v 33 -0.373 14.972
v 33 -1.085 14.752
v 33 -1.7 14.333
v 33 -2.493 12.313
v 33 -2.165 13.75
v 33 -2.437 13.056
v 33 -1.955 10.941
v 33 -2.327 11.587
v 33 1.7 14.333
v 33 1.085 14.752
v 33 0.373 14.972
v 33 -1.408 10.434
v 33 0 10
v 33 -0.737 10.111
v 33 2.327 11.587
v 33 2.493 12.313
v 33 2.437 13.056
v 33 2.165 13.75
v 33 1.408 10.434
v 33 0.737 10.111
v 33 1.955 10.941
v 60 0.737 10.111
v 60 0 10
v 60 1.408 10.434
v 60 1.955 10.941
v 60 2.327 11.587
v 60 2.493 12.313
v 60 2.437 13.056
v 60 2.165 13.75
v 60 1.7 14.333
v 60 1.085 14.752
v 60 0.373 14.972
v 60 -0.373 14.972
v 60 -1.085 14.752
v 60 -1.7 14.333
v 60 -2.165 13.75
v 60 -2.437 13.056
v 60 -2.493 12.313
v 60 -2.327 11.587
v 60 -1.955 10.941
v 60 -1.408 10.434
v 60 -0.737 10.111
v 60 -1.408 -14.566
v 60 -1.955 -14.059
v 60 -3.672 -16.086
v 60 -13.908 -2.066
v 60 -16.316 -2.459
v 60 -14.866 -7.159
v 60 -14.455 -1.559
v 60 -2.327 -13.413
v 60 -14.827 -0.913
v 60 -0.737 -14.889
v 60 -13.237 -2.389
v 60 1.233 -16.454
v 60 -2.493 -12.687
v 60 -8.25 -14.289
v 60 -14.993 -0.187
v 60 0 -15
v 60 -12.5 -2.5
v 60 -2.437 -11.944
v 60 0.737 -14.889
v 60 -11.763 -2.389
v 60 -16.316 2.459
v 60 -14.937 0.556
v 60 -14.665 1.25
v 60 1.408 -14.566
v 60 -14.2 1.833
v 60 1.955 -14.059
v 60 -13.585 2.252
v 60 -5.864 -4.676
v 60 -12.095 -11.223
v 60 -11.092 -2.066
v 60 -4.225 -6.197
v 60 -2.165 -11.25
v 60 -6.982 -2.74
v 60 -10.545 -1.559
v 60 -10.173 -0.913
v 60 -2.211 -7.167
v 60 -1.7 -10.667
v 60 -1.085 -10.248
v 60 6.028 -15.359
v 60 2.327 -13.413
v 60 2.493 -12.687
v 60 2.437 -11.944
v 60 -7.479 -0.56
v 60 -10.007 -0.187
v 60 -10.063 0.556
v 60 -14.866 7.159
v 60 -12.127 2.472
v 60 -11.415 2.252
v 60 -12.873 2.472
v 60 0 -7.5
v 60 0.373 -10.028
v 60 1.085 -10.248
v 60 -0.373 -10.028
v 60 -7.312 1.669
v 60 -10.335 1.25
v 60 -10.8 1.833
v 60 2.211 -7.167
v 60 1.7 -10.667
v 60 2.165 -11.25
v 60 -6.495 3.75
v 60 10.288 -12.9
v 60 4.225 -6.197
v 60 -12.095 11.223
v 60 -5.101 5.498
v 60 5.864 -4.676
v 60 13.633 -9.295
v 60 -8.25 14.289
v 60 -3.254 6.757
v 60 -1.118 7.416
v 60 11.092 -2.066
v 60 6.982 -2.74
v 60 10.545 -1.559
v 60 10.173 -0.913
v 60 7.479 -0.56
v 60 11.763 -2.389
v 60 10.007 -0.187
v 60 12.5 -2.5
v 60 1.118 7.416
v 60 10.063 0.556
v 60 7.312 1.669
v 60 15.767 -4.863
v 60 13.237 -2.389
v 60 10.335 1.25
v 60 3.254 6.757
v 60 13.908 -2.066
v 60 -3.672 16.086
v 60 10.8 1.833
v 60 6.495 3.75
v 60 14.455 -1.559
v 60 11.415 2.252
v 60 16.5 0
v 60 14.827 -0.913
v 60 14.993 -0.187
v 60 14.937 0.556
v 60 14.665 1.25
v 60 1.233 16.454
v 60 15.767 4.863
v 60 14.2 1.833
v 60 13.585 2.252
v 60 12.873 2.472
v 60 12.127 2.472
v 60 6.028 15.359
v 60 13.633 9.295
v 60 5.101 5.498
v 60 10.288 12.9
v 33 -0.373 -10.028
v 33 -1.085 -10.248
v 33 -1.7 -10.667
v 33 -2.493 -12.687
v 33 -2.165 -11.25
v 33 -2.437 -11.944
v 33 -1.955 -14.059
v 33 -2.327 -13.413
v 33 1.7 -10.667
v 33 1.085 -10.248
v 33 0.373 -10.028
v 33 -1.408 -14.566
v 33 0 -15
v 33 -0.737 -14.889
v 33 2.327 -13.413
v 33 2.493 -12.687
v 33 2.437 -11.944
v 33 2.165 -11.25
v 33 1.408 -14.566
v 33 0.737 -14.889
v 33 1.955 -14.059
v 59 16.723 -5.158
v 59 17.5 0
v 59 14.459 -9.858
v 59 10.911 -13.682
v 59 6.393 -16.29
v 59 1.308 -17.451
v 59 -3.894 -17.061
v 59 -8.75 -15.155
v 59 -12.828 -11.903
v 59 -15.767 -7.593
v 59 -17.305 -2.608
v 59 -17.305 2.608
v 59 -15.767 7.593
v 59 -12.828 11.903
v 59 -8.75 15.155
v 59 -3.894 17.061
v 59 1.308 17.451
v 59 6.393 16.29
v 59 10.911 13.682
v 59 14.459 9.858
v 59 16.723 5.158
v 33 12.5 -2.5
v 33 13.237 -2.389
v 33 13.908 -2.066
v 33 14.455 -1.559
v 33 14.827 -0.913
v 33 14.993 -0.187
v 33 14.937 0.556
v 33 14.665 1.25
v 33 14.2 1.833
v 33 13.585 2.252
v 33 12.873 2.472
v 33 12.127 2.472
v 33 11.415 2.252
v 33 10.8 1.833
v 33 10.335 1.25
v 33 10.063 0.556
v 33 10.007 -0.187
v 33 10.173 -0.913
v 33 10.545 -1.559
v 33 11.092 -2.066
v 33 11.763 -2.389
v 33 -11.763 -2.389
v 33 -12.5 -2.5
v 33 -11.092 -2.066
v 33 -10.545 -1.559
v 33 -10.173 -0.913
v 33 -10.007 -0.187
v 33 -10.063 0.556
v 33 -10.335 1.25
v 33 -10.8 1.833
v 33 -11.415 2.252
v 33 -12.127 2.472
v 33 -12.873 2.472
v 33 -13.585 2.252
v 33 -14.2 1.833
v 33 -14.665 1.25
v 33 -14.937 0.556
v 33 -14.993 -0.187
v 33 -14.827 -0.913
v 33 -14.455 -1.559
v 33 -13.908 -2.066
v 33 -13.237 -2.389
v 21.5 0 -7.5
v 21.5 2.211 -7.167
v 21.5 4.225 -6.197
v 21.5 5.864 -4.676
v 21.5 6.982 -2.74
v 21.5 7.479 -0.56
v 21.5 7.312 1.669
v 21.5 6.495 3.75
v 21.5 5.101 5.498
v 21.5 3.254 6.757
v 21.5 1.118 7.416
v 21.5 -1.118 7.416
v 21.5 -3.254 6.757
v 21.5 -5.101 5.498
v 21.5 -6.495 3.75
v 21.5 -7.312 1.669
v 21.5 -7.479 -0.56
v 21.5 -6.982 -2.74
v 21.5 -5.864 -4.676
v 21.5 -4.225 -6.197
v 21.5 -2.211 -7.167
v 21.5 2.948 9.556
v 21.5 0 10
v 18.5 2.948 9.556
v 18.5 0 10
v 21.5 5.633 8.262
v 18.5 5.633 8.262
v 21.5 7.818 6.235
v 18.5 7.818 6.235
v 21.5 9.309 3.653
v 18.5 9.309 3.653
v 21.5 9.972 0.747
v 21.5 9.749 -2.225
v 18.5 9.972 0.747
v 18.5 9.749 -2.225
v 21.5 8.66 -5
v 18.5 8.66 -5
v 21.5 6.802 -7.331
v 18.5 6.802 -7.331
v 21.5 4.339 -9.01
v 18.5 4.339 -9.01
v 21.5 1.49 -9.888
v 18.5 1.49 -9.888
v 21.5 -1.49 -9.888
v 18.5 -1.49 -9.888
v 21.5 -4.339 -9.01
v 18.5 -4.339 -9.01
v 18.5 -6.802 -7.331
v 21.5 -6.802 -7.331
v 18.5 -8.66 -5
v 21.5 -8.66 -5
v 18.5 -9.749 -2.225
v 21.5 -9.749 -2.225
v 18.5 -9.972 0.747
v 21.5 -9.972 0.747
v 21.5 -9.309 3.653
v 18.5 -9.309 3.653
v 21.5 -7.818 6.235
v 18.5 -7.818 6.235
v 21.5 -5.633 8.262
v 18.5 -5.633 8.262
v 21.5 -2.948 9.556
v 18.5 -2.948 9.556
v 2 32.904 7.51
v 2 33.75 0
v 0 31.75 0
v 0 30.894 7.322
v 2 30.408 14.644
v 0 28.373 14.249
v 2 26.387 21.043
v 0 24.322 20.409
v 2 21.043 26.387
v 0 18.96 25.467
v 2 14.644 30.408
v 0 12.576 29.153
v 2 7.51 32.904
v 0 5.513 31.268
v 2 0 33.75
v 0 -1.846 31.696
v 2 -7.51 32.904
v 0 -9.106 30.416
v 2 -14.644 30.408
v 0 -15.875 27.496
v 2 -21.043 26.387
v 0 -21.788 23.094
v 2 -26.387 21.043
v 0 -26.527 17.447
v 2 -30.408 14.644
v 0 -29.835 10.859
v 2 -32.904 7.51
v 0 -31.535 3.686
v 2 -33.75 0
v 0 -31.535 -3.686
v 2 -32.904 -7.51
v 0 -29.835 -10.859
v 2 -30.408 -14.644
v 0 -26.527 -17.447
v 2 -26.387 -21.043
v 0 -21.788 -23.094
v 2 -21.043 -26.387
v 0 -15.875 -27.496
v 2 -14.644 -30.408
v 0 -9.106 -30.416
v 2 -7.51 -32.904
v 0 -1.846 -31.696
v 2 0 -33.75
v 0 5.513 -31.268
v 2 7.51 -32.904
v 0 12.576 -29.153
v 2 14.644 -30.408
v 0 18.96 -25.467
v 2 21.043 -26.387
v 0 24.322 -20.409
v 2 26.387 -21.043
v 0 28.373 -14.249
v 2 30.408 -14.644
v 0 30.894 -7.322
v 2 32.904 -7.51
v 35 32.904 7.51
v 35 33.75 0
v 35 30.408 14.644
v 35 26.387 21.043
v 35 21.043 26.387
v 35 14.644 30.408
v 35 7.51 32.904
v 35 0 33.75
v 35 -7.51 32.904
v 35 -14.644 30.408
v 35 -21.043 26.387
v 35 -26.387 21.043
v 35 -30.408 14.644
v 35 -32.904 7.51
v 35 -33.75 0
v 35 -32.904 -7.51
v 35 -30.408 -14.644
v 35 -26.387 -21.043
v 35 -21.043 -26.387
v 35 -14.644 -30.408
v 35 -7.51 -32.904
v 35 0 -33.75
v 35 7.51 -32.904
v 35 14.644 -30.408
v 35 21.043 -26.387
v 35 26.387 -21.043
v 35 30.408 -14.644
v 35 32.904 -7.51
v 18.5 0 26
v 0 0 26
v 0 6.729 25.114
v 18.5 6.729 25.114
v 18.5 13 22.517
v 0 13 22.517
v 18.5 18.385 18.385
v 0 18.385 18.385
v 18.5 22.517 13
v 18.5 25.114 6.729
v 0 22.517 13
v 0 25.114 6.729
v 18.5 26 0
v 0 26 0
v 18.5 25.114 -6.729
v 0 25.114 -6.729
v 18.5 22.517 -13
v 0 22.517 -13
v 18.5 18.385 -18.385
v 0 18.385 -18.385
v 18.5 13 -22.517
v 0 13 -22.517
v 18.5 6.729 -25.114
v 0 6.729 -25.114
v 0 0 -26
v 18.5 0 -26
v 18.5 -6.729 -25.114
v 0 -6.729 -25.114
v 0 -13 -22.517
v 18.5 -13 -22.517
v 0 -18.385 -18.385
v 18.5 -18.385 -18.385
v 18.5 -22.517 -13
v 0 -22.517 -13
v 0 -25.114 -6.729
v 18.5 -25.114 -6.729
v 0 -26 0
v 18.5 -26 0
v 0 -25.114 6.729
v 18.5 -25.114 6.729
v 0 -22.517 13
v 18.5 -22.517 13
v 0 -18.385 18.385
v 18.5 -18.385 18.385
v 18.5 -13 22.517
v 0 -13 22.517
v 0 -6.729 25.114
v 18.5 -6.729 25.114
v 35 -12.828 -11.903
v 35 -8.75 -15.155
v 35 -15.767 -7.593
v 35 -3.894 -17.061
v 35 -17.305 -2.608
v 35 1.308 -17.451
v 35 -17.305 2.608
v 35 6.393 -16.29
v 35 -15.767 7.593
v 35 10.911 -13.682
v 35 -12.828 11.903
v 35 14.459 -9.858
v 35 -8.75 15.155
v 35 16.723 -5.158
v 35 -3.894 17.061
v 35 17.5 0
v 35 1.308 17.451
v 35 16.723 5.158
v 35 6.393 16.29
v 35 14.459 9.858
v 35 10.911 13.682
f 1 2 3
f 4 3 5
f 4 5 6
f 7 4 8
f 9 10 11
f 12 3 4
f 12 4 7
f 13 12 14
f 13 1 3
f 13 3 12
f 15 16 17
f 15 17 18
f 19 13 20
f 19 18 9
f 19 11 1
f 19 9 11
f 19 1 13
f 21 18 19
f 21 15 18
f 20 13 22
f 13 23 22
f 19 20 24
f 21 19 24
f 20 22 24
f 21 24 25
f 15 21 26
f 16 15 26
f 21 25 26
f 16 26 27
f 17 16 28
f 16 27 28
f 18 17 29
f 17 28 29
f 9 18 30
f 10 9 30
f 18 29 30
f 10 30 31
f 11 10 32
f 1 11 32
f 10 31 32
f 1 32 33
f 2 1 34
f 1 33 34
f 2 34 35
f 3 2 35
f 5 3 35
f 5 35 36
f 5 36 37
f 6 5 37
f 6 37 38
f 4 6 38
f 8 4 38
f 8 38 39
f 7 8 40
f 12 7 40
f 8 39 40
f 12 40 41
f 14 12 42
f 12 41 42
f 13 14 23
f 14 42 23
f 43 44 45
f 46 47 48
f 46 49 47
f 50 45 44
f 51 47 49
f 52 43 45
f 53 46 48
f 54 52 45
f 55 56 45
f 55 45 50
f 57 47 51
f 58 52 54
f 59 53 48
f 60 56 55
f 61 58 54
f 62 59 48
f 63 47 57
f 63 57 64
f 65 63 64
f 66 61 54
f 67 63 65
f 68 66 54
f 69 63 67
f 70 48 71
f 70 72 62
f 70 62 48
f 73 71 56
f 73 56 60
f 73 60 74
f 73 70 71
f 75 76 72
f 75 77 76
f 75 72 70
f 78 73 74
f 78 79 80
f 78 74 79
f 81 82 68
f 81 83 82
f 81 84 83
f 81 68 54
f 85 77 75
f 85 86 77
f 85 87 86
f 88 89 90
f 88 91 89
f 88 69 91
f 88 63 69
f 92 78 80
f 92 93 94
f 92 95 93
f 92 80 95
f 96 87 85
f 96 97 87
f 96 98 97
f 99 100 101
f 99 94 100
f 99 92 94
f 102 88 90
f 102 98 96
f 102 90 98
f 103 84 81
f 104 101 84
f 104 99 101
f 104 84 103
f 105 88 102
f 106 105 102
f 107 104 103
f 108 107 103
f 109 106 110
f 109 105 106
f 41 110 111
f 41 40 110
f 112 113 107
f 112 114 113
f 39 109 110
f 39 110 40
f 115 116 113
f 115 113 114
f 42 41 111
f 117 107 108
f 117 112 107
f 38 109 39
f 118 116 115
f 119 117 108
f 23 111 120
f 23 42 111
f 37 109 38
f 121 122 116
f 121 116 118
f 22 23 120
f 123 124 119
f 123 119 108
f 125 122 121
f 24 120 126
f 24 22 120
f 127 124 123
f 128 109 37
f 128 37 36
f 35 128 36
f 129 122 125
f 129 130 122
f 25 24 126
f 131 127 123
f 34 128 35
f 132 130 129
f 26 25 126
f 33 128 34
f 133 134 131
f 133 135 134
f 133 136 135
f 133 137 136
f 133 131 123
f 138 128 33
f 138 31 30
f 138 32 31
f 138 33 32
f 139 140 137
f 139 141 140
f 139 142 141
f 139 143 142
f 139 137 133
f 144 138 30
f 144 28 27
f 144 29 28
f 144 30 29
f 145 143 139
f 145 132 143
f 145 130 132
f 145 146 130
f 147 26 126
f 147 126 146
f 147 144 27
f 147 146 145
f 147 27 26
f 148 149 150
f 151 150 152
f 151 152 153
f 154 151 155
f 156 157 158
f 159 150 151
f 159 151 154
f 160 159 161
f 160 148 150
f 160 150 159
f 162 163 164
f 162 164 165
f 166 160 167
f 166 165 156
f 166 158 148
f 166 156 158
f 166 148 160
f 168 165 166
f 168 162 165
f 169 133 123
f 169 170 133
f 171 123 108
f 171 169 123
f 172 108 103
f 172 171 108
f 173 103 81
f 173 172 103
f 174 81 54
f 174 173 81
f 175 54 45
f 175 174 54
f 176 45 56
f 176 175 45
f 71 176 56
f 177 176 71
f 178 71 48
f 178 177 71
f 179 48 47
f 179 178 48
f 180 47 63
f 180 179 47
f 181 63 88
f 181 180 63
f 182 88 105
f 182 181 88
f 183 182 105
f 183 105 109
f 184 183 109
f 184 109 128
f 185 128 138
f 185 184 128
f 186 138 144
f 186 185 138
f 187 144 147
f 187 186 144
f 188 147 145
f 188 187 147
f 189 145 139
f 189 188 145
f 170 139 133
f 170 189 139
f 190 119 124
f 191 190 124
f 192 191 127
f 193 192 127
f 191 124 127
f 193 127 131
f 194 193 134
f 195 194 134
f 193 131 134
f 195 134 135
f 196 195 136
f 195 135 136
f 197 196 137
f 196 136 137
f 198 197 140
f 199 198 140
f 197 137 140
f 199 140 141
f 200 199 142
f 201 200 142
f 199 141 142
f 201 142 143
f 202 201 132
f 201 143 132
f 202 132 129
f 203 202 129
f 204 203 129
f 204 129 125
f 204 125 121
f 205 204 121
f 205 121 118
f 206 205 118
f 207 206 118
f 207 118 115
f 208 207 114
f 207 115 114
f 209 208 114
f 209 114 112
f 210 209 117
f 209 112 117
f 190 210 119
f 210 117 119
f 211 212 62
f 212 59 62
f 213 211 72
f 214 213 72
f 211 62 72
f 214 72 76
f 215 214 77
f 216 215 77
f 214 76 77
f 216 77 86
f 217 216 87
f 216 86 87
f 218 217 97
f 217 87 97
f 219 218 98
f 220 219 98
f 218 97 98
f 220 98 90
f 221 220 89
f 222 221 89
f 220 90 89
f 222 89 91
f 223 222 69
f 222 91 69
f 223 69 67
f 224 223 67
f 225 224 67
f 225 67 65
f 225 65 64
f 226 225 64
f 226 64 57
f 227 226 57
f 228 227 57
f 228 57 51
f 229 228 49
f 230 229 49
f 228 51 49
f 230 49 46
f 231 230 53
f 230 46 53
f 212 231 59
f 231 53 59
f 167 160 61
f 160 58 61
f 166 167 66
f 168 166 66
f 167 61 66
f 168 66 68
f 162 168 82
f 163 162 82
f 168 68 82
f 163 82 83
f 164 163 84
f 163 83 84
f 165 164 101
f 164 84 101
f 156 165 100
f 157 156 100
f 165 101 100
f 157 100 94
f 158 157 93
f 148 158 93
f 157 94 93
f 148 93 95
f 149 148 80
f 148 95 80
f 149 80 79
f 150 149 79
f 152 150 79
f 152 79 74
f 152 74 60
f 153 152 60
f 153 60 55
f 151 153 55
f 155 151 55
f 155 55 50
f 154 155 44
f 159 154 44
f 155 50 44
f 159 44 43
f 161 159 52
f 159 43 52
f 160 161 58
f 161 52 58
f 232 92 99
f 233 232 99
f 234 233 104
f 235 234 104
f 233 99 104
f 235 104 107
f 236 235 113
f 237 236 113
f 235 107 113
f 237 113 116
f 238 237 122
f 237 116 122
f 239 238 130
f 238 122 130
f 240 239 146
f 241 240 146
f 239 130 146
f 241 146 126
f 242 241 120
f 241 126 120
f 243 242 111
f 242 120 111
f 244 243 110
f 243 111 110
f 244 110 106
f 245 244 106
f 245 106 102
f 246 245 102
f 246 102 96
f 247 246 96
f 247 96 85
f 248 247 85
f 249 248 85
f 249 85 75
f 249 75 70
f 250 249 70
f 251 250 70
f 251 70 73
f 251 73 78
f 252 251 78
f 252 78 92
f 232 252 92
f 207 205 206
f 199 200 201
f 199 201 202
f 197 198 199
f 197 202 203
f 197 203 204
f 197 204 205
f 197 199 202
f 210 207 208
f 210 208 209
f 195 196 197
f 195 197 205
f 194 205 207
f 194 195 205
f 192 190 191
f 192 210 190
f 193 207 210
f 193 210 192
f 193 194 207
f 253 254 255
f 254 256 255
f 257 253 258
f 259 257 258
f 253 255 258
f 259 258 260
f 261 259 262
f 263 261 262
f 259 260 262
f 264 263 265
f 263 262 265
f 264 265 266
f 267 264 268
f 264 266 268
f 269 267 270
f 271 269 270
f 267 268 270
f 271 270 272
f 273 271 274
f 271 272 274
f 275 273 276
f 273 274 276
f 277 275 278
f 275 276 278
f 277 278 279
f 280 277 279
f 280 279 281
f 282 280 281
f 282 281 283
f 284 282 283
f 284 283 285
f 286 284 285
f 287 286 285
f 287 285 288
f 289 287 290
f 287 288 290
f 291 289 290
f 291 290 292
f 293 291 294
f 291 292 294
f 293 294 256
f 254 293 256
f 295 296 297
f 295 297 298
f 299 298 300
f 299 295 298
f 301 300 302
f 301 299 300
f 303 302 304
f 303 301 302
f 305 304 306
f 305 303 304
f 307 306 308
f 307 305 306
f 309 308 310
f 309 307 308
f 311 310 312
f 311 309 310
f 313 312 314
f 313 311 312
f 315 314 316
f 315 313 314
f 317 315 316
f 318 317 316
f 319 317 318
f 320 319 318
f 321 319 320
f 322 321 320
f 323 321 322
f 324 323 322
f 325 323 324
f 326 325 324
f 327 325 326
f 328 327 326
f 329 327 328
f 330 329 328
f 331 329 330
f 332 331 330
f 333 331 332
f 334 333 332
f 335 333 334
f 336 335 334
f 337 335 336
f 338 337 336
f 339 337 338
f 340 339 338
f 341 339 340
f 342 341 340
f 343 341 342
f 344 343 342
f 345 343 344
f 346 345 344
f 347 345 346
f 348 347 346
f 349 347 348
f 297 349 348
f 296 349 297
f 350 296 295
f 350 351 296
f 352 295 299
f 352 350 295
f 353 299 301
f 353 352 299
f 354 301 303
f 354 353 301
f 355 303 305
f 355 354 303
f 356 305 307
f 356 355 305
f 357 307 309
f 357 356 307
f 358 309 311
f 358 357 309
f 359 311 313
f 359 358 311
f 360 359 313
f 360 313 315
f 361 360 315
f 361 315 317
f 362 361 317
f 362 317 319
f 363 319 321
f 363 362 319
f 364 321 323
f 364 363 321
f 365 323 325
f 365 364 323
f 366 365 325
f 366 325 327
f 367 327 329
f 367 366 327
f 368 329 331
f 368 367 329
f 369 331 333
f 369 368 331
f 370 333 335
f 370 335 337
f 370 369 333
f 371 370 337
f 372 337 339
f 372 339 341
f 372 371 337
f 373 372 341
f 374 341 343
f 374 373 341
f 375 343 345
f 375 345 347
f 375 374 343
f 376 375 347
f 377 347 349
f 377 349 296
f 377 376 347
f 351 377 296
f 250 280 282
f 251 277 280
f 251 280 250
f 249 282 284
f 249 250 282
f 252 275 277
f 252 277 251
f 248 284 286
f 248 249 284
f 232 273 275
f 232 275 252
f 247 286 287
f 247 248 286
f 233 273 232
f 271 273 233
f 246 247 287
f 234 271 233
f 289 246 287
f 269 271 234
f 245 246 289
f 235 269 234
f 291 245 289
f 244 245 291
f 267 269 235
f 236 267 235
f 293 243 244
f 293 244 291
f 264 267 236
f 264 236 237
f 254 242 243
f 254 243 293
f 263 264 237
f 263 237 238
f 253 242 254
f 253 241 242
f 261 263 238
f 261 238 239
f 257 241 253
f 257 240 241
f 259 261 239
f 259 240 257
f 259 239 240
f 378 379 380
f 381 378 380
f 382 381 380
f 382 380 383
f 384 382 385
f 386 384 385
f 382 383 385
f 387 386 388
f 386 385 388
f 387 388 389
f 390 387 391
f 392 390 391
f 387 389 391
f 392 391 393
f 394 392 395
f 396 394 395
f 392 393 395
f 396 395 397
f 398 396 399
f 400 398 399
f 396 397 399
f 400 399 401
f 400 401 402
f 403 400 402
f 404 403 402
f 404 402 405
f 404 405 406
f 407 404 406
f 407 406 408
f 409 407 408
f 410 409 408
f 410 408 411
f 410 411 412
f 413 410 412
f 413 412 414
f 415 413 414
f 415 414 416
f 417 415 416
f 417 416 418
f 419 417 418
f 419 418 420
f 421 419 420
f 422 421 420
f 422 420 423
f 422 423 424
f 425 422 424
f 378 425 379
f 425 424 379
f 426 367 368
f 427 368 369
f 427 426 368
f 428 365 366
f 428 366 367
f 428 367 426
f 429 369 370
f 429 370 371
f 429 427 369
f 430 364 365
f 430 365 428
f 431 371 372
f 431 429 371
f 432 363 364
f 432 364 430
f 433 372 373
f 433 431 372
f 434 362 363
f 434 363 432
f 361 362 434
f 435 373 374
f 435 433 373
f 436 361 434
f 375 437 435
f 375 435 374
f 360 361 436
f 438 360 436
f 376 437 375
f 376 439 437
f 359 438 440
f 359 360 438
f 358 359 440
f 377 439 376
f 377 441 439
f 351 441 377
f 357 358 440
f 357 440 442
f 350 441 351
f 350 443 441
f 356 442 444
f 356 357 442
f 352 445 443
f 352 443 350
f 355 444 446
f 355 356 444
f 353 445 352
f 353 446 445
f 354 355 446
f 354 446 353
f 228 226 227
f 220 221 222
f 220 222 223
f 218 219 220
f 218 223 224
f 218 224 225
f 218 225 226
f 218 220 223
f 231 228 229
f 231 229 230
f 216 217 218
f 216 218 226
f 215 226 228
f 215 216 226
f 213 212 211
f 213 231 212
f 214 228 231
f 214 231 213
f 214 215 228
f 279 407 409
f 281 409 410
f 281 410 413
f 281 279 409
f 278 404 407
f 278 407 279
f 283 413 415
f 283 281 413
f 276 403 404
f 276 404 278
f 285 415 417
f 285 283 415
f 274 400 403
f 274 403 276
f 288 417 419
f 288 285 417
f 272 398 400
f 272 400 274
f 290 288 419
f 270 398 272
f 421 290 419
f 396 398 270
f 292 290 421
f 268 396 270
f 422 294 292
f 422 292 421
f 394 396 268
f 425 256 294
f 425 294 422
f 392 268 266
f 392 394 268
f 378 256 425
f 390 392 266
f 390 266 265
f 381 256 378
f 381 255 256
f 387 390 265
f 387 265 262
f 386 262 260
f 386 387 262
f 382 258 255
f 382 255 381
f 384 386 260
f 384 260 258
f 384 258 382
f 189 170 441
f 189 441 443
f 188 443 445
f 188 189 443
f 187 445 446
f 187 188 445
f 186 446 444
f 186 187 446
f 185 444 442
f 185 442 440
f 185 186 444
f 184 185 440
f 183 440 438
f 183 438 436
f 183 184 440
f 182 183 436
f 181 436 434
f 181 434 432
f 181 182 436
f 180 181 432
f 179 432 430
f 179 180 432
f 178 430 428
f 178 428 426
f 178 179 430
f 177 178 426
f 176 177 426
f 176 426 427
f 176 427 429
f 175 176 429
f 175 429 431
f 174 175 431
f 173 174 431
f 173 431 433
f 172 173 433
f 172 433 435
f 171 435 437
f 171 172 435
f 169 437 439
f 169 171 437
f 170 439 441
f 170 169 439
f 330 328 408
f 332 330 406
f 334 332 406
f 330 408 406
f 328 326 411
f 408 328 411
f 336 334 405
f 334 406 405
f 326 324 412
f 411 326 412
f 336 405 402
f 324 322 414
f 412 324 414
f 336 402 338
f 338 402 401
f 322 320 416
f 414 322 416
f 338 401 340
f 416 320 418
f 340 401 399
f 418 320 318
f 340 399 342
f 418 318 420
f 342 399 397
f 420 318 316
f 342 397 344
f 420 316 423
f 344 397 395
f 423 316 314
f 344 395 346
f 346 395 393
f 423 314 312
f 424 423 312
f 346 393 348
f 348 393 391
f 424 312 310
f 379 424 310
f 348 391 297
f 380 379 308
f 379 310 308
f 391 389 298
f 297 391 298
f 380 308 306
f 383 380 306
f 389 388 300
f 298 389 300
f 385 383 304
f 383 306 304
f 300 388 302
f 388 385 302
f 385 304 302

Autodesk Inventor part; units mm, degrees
ref_plane "YZ Plane" through (0, 0, 0) normal (1, 0, 0) x (0, 1, 0)
ref_plane "XZ Plane" through (0, 0, 0) normal (0, 1, 0) x (-1, 0, 0)
ref_plane "XY Plane" through (0, 0, 0) normal (0, 0, 1) x (1, 0, 0)
sketch "Sketch1" plane through (0, 0, 0) normal (0, 0, 1) x (1, 0, 0)
  line L0 (0, 0) -> (0, 33.75)
  line L1 (0, 33.75) -> (35, 33.75)
  line L2 (35, 17.5) -> (60, 17.5)
  line L3 (35, 33.75) -> (35, 17.5)
  line L4 (60, 17.5) -> (60, 0)
  line L5 (0, 0) -> (60, 0)
  dimension "d0" = 33.75
  dimension "d1" = 35
  dimension "d3" = 25
revolve "Revolution1" add sketch "Sketch1" angle 360 about axis through (0, 0, 0) along (1, 0, 0)
thread "Thread1" size "M20x2.5" class "6g" standard "ISO Metric profile" full length
sketch "Sketch2" plane through (60, 0, 0) normal (1, 0, 0) x (0, 0, -1)
  circle A0 centre (0, 0) radius 7.5
  dimension "d7" = 15
extrude "Extrusion1" cut sketch "Sketch2" against normal through all
chamfer "Chamfer1" distance 2 angle 45 1 edges at (0, -33.75, 0)
chamfer "Chamfer2" distance 1 angle 45 1 edges at (60, -17.5, 0)
sketch "Sketch3" plane through (0, 0, 0) normal (-1, 0, 0) x (0, 0, 1)
  circle A0 centre (0, 0) radius 26
  dimension "d16" = 52
extrude "Extrusion2" cut sketch "Sketch3" against normal blind 18.5
sketch "Sketch4" plane through (18.5, 0, 0) normal (-1, 0, 0) x (0, 0, 1)
  circle A0 centre (0, 0) radius 10
  dimension "d19" = 20
extrude "Extrusion3" cut sketch "Sketch4" against normal blind 3
sketch "Sketch5" plane through (60, 0, 0) normal (1, 0, 0) x (0, 0, -1)
  circle A0 centre (0, 0) radius 7.5 projected
  circle A1 centre (0, 12.5) radius 2.5
  circle A2 centre (12.5, 0) radius 2.5
  circle A3 centre (0, -12.5) radius 2.5
  circle A4 centre (-12.5, 0) radius 2.5
  dimension "d26" = 5
  dimension "d27" = 5
  dimension "d28" = 5
  dimension "d29" = 5
extrude "Extrusion4" cut sketch "Sketch5" against normal blind 27 contours A1 | A2 | A3 | A4
thread "Thread2" size "M5x0.8" class "6H" standard "ISO Metric profile" full length
thread "Thread3" size "M5x0.8" class "6H" standard "ISO Metric profile" full length
thread "Thread4" size "M5x0.8" class "6H" standard "ISO Metric profile" full length
thread "Thread5" size "M5x0.8" class "6H" standard "ISO Metric profile" full length
properties part number "eixo parafuso"
